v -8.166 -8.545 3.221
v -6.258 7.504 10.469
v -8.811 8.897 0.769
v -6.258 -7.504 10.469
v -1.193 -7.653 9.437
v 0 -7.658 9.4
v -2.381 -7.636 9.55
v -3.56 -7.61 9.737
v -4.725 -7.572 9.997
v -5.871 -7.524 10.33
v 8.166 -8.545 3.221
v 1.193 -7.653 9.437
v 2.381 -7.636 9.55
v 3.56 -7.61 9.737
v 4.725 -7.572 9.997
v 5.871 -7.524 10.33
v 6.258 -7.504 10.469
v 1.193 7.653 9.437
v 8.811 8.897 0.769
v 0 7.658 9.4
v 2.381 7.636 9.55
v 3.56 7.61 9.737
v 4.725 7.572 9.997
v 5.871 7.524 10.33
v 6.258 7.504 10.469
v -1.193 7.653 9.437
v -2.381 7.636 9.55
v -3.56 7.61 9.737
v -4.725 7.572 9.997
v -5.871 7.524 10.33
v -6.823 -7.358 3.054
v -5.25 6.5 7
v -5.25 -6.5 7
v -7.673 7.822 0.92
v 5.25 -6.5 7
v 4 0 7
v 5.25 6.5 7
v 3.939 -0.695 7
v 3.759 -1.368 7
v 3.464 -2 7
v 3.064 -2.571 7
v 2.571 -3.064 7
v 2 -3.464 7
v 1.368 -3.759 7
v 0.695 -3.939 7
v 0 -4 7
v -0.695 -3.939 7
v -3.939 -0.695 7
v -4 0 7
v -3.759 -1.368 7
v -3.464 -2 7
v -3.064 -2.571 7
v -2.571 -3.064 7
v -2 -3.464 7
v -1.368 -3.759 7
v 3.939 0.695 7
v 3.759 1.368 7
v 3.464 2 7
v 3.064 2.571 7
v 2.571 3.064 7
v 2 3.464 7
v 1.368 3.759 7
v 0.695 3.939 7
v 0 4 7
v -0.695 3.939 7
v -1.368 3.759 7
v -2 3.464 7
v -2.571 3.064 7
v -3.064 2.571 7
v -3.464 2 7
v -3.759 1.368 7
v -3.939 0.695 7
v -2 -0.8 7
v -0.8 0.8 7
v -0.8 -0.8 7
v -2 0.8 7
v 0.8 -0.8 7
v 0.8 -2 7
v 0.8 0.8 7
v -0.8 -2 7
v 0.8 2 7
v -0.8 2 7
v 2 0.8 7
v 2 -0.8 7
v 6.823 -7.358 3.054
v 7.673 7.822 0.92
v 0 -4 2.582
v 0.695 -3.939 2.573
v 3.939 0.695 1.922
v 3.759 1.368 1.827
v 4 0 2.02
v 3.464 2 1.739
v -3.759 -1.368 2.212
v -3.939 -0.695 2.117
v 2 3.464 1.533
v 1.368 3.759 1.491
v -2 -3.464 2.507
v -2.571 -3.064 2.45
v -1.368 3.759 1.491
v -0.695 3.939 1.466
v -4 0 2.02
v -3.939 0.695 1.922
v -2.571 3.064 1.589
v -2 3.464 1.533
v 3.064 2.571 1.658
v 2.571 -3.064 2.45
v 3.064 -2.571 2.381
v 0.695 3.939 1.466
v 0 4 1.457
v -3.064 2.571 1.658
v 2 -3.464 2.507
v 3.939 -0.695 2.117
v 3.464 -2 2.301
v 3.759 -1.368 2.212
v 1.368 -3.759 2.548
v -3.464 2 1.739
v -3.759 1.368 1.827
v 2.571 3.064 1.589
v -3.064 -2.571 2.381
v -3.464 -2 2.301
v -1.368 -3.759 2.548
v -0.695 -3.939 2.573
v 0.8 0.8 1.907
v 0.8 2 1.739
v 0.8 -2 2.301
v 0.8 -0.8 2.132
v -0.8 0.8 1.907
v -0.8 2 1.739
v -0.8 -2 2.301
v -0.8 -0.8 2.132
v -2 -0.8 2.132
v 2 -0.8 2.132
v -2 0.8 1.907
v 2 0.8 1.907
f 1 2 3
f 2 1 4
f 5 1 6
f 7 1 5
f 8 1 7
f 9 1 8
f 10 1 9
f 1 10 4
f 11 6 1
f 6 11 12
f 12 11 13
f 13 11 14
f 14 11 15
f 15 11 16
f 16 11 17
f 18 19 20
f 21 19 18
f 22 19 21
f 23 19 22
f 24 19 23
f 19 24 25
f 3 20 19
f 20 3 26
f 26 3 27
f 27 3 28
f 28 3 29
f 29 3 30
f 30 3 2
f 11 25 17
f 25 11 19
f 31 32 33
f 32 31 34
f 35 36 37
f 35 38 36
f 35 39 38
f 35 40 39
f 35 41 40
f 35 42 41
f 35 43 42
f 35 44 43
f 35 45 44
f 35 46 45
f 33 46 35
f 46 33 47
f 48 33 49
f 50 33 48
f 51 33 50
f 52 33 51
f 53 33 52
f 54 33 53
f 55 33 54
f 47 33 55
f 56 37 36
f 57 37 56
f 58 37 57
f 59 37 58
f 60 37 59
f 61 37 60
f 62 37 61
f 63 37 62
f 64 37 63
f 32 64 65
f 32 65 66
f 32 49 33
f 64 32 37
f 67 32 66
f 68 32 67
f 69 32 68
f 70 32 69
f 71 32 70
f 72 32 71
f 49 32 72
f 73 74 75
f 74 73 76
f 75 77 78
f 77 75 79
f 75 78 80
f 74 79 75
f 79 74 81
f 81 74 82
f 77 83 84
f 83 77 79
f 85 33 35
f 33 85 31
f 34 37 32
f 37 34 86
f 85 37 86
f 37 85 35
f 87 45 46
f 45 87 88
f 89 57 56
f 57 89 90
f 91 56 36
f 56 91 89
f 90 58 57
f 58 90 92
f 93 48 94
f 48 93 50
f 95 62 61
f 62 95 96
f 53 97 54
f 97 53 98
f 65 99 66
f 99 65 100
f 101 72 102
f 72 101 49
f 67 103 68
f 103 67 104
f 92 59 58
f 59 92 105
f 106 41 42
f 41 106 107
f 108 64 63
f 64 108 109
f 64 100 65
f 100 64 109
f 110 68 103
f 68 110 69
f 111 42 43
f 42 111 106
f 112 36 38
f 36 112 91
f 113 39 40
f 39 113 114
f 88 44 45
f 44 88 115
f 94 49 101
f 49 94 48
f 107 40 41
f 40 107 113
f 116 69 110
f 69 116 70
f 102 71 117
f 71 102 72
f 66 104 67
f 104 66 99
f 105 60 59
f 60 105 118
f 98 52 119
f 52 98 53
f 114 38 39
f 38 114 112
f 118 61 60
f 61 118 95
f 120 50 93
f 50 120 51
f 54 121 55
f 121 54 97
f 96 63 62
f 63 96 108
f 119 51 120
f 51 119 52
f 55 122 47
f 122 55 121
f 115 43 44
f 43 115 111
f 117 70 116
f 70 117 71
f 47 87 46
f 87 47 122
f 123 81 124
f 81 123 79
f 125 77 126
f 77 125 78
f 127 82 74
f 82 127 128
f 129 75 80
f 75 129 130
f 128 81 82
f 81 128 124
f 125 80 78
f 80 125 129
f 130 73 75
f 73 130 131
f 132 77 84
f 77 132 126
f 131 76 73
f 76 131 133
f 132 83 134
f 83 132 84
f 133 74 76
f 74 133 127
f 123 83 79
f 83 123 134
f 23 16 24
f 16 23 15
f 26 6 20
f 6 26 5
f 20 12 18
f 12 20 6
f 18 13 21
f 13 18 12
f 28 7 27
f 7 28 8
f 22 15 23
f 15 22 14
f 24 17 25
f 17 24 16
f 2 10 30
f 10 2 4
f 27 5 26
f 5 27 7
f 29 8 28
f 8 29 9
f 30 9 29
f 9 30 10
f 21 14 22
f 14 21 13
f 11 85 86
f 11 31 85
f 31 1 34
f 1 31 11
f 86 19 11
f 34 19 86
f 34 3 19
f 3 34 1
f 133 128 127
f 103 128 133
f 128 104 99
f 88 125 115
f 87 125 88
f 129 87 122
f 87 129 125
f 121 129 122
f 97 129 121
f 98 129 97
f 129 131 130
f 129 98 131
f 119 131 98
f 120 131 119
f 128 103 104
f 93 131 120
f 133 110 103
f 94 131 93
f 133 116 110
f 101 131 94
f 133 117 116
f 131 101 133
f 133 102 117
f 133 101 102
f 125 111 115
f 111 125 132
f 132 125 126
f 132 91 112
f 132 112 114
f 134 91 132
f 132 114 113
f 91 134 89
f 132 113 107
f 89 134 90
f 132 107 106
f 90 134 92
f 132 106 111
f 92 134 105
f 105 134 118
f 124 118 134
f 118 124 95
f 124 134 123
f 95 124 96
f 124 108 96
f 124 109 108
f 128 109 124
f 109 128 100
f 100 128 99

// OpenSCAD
module caozhu()
{
    difference() {
        cylinder(7.9, r=4, center=true, $fn=36);

        cube([1.6, 4, 8], center=true);
        rotate([0, 0, 90]) {
            cube([1.6, 4, 8], center=true);
        }
    }
}

module zhuti()
{
    difference() {
        hull() {
            cube([18, 18, 0.1], center=true);
            translate([0, 0, 10]) {
                cube([12.5, 15, 1], center=true);
            }
        }

        hull() {
            cube([16, 16, 0.2], center=true);
            translate([0, 0, 6.5]) {
                cube([10.5, 13, 1], center=true);
            }
        }
    }
}

module chengshuti()
{
    zhuti();
    translate([0, 0, 3.5]) {
        caozhu();
    }
}

module qiehu()
{
    translate([0, 0, 28.4]) {
        rotate([90, 0, 0]) {
            cylinder(20, r=19, center=true, $fn=100);
        }
    }
}

module qiedi()
{  
    rotate([-8, 0, 0]) {
        cube([20, 20, 4], center=true);
    }
}

difference() {
    chengshuti();
    qiehu();
    qiedi();
}
